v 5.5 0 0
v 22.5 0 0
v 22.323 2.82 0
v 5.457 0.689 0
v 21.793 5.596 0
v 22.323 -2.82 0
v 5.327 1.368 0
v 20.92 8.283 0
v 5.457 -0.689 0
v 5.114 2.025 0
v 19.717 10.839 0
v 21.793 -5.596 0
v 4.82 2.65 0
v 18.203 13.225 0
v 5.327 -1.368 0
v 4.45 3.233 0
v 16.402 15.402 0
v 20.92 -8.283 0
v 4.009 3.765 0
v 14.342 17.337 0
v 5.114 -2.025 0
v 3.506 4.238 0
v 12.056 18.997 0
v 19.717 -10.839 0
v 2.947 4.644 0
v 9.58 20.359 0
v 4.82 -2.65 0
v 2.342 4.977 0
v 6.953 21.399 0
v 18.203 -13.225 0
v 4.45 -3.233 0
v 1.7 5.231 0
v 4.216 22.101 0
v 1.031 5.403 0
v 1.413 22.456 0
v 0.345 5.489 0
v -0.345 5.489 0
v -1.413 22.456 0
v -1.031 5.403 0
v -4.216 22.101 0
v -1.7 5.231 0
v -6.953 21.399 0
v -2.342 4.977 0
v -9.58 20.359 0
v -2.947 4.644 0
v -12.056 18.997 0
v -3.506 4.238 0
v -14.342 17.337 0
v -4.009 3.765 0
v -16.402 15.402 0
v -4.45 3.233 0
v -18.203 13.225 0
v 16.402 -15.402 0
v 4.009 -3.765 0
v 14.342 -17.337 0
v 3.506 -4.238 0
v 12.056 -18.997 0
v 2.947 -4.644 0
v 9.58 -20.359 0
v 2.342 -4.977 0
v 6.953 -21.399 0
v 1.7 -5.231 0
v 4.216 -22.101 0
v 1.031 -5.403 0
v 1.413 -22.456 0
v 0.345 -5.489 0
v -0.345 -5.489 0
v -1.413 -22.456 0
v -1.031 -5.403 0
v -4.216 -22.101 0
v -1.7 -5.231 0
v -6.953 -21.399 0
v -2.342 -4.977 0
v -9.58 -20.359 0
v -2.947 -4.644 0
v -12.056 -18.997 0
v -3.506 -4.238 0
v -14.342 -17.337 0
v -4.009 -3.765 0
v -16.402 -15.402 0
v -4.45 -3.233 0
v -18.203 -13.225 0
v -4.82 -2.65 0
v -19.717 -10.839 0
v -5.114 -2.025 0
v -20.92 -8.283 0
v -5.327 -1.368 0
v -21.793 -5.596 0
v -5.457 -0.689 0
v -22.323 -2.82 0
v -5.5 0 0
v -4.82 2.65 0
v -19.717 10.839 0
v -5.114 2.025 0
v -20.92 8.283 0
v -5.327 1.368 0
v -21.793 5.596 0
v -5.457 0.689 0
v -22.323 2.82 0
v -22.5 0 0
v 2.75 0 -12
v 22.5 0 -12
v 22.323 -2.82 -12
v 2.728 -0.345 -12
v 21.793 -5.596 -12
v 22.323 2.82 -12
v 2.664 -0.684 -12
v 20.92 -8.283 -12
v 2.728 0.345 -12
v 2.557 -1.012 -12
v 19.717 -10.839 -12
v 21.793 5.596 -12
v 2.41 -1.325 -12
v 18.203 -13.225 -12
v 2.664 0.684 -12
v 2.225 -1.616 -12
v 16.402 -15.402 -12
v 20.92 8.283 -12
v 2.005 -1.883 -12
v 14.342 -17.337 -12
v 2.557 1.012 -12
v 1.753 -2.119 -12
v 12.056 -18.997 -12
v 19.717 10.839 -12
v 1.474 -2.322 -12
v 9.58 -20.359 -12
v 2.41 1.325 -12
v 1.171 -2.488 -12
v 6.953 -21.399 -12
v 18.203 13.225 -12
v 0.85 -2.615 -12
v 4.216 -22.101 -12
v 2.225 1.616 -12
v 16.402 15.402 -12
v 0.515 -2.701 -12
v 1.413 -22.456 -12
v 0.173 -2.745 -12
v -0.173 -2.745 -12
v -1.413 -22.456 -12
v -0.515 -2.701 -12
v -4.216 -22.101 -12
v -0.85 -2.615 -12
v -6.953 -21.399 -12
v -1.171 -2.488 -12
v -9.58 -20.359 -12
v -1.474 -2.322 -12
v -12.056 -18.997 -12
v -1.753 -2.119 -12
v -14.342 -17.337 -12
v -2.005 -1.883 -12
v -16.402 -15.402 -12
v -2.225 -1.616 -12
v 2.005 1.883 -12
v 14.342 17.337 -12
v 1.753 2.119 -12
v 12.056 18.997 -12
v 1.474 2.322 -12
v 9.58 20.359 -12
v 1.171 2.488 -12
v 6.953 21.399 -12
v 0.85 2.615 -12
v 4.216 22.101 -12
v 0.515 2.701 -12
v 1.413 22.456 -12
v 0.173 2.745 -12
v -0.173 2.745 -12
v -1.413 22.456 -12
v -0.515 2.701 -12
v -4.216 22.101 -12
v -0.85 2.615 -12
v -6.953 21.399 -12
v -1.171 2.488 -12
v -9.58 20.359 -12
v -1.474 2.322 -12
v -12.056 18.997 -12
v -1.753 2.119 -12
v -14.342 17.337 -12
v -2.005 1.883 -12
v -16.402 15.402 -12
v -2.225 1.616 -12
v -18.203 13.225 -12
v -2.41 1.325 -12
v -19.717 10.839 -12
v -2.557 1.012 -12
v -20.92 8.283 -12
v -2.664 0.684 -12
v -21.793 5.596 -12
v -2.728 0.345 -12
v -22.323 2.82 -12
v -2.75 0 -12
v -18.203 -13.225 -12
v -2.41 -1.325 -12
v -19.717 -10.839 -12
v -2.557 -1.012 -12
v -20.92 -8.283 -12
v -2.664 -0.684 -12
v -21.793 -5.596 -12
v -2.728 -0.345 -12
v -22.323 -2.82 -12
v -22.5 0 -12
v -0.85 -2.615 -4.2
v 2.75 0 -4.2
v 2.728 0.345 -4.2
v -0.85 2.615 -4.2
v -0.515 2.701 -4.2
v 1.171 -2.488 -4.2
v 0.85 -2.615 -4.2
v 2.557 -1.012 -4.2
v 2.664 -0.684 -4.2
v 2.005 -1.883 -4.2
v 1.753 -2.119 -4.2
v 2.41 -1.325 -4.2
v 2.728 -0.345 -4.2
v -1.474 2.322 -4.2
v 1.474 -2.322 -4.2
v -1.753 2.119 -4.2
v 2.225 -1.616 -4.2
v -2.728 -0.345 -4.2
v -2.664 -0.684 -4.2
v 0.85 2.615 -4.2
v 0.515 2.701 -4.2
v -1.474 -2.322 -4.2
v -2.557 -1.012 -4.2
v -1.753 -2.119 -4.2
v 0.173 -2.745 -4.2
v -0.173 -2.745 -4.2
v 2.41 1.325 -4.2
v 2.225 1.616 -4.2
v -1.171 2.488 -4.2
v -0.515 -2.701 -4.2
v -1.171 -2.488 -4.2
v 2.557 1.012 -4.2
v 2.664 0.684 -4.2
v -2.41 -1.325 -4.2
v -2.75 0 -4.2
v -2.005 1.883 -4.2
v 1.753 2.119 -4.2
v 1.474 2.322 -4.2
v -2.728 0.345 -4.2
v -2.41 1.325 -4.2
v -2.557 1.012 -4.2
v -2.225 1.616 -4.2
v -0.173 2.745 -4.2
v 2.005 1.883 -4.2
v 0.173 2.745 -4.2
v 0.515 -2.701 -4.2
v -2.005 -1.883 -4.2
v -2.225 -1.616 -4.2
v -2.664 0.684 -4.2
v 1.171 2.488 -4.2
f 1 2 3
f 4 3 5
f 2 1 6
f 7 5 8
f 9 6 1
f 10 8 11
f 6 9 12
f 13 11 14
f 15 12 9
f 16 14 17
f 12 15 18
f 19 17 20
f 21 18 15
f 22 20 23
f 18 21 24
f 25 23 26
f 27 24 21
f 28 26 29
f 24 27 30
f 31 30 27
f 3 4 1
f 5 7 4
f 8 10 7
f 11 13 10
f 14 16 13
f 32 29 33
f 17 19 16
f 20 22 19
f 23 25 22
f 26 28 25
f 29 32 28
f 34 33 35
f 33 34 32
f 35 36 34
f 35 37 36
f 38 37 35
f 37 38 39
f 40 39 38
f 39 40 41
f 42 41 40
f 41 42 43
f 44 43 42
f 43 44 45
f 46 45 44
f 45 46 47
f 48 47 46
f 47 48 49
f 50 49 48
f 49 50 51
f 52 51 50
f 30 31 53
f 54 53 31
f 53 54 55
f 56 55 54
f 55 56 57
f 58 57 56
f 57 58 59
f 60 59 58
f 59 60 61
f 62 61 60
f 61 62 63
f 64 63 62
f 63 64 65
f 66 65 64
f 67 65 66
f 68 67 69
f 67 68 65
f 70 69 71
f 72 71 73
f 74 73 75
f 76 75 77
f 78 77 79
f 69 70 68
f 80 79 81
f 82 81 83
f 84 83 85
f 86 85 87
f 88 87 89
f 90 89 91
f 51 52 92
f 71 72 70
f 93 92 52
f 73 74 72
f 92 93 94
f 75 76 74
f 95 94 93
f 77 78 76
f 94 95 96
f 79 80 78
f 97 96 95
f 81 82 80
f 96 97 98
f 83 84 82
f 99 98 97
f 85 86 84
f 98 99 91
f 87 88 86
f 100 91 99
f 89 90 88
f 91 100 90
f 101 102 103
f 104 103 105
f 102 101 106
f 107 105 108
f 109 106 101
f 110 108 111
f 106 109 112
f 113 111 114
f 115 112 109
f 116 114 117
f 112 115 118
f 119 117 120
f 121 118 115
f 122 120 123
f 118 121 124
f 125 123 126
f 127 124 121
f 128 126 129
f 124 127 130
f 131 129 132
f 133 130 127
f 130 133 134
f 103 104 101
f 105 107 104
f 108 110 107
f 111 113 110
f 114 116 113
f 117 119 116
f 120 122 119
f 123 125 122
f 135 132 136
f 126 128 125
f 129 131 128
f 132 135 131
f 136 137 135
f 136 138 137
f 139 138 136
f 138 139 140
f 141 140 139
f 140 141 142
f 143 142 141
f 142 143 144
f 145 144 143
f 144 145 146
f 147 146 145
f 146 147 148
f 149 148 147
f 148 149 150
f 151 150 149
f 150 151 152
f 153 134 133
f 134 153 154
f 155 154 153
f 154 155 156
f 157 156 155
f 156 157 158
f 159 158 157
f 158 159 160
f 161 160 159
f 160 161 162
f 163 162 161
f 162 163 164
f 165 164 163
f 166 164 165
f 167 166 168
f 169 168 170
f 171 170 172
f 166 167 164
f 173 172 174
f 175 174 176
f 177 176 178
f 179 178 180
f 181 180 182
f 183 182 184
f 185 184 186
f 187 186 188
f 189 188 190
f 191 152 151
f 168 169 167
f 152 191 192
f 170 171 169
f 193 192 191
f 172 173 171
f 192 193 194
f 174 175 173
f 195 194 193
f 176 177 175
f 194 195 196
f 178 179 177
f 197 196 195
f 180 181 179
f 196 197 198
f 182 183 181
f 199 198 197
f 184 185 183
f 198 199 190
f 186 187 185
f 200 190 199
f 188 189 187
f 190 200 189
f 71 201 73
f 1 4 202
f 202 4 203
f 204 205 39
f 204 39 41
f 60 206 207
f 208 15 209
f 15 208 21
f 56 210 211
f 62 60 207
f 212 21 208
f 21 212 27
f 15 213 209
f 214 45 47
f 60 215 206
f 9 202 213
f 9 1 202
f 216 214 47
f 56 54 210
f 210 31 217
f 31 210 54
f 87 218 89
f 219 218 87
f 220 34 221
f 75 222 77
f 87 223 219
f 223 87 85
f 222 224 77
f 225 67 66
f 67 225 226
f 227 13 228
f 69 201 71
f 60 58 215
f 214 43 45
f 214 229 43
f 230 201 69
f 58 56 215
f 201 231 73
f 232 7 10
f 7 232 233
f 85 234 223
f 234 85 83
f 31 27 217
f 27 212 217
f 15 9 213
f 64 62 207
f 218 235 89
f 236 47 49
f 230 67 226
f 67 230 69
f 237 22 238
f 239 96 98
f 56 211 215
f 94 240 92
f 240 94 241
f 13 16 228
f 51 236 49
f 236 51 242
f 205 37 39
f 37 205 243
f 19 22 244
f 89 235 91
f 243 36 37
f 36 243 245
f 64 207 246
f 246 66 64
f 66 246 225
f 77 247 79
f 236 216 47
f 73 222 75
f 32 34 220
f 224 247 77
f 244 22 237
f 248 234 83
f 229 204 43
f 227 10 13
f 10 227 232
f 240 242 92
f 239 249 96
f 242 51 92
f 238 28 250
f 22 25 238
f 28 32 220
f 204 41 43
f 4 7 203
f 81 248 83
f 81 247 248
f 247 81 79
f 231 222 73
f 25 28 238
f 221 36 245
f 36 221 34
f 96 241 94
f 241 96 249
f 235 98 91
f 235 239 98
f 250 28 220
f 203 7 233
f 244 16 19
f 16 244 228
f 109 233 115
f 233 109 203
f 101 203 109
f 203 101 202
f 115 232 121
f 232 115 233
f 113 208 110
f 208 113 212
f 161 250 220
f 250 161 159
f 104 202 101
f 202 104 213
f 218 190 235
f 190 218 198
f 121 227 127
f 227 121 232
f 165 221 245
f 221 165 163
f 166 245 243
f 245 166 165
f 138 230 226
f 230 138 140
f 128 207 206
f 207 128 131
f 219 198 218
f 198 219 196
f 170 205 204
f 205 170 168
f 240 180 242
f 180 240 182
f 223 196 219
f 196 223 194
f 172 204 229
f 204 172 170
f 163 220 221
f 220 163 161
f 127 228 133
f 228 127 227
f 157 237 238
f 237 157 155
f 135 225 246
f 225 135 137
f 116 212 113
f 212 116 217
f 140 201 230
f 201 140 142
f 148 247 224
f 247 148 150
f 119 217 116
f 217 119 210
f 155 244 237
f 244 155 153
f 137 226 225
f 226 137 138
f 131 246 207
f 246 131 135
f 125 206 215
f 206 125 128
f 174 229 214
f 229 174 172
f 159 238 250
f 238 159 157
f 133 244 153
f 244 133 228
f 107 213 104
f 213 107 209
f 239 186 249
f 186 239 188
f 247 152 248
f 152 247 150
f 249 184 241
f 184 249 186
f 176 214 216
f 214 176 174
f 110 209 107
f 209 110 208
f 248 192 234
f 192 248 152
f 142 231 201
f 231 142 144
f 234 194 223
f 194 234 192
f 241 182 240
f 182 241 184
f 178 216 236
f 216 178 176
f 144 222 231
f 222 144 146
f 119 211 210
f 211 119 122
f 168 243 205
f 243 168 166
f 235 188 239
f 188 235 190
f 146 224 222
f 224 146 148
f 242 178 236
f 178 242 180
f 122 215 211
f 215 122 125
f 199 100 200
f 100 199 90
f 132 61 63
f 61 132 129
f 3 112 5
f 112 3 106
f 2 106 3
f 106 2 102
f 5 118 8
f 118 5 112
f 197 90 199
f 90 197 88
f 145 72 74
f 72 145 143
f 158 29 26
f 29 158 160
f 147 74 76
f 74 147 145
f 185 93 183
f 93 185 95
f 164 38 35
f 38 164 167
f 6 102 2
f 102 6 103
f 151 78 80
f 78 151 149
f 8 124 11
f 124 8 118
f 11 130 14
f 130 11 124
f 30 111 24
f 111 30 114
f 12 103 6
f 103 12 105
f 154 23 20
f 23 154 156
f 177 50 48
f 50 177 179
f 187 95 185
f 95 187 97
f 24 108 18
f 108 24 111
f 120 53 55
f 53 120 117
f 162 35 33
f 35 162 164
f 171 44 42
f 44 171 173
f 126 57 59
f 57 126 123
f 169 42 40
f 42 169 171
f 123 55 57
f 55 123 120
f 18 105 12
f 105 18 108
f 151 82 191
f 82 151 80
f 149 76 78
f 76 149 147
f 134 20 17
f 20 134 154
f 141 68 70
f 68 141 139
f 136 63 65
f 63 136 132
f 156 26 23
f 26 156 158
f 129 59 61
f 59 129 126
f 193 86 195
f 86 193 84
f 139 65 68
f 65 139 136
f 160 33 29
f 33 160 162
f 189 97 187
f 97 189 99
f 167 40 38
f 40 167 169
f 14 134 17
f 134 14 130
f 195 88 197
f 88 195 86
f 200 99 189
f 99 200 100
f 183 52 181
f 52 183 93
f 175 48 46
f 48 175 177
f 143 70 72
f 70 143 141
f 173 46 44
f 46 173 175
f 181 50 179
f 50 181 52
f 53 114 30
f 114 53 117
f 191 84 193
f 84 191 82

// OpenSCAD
$fn = 50;


difference() {
	union() {
		translate(v = [0, 0, -12.0000000000]) {
			cylinder(h = 12, r = 22.5000000000);
		}
	}
	union() {
		translate(v = [0, 0, 0]) {
			rotate(a = [0, 0, 0]) {
				difference() {
					union() {
						translate(v = [0, 0, -12.0000000000]) {
							cylinder(h = 12, r = 2.2500000000);
						}
						translate(v = [0, 0, -4.2000000000]) {
							cylinder(h = 4.2000000000, r1 = 2.7500000000, r2 = 5.5000000000);
						}
						translate(v = [0, 0, -12.0000000000]) {
							cylinder(h = 12, r = 2.7500000000);
						}
						translate(v = [0, 0, -12.0000000000]) {
							cylinder(h = 12, r = 2.2500000000);
						}
					}
					union();
				}
			}
		}
	}
}
